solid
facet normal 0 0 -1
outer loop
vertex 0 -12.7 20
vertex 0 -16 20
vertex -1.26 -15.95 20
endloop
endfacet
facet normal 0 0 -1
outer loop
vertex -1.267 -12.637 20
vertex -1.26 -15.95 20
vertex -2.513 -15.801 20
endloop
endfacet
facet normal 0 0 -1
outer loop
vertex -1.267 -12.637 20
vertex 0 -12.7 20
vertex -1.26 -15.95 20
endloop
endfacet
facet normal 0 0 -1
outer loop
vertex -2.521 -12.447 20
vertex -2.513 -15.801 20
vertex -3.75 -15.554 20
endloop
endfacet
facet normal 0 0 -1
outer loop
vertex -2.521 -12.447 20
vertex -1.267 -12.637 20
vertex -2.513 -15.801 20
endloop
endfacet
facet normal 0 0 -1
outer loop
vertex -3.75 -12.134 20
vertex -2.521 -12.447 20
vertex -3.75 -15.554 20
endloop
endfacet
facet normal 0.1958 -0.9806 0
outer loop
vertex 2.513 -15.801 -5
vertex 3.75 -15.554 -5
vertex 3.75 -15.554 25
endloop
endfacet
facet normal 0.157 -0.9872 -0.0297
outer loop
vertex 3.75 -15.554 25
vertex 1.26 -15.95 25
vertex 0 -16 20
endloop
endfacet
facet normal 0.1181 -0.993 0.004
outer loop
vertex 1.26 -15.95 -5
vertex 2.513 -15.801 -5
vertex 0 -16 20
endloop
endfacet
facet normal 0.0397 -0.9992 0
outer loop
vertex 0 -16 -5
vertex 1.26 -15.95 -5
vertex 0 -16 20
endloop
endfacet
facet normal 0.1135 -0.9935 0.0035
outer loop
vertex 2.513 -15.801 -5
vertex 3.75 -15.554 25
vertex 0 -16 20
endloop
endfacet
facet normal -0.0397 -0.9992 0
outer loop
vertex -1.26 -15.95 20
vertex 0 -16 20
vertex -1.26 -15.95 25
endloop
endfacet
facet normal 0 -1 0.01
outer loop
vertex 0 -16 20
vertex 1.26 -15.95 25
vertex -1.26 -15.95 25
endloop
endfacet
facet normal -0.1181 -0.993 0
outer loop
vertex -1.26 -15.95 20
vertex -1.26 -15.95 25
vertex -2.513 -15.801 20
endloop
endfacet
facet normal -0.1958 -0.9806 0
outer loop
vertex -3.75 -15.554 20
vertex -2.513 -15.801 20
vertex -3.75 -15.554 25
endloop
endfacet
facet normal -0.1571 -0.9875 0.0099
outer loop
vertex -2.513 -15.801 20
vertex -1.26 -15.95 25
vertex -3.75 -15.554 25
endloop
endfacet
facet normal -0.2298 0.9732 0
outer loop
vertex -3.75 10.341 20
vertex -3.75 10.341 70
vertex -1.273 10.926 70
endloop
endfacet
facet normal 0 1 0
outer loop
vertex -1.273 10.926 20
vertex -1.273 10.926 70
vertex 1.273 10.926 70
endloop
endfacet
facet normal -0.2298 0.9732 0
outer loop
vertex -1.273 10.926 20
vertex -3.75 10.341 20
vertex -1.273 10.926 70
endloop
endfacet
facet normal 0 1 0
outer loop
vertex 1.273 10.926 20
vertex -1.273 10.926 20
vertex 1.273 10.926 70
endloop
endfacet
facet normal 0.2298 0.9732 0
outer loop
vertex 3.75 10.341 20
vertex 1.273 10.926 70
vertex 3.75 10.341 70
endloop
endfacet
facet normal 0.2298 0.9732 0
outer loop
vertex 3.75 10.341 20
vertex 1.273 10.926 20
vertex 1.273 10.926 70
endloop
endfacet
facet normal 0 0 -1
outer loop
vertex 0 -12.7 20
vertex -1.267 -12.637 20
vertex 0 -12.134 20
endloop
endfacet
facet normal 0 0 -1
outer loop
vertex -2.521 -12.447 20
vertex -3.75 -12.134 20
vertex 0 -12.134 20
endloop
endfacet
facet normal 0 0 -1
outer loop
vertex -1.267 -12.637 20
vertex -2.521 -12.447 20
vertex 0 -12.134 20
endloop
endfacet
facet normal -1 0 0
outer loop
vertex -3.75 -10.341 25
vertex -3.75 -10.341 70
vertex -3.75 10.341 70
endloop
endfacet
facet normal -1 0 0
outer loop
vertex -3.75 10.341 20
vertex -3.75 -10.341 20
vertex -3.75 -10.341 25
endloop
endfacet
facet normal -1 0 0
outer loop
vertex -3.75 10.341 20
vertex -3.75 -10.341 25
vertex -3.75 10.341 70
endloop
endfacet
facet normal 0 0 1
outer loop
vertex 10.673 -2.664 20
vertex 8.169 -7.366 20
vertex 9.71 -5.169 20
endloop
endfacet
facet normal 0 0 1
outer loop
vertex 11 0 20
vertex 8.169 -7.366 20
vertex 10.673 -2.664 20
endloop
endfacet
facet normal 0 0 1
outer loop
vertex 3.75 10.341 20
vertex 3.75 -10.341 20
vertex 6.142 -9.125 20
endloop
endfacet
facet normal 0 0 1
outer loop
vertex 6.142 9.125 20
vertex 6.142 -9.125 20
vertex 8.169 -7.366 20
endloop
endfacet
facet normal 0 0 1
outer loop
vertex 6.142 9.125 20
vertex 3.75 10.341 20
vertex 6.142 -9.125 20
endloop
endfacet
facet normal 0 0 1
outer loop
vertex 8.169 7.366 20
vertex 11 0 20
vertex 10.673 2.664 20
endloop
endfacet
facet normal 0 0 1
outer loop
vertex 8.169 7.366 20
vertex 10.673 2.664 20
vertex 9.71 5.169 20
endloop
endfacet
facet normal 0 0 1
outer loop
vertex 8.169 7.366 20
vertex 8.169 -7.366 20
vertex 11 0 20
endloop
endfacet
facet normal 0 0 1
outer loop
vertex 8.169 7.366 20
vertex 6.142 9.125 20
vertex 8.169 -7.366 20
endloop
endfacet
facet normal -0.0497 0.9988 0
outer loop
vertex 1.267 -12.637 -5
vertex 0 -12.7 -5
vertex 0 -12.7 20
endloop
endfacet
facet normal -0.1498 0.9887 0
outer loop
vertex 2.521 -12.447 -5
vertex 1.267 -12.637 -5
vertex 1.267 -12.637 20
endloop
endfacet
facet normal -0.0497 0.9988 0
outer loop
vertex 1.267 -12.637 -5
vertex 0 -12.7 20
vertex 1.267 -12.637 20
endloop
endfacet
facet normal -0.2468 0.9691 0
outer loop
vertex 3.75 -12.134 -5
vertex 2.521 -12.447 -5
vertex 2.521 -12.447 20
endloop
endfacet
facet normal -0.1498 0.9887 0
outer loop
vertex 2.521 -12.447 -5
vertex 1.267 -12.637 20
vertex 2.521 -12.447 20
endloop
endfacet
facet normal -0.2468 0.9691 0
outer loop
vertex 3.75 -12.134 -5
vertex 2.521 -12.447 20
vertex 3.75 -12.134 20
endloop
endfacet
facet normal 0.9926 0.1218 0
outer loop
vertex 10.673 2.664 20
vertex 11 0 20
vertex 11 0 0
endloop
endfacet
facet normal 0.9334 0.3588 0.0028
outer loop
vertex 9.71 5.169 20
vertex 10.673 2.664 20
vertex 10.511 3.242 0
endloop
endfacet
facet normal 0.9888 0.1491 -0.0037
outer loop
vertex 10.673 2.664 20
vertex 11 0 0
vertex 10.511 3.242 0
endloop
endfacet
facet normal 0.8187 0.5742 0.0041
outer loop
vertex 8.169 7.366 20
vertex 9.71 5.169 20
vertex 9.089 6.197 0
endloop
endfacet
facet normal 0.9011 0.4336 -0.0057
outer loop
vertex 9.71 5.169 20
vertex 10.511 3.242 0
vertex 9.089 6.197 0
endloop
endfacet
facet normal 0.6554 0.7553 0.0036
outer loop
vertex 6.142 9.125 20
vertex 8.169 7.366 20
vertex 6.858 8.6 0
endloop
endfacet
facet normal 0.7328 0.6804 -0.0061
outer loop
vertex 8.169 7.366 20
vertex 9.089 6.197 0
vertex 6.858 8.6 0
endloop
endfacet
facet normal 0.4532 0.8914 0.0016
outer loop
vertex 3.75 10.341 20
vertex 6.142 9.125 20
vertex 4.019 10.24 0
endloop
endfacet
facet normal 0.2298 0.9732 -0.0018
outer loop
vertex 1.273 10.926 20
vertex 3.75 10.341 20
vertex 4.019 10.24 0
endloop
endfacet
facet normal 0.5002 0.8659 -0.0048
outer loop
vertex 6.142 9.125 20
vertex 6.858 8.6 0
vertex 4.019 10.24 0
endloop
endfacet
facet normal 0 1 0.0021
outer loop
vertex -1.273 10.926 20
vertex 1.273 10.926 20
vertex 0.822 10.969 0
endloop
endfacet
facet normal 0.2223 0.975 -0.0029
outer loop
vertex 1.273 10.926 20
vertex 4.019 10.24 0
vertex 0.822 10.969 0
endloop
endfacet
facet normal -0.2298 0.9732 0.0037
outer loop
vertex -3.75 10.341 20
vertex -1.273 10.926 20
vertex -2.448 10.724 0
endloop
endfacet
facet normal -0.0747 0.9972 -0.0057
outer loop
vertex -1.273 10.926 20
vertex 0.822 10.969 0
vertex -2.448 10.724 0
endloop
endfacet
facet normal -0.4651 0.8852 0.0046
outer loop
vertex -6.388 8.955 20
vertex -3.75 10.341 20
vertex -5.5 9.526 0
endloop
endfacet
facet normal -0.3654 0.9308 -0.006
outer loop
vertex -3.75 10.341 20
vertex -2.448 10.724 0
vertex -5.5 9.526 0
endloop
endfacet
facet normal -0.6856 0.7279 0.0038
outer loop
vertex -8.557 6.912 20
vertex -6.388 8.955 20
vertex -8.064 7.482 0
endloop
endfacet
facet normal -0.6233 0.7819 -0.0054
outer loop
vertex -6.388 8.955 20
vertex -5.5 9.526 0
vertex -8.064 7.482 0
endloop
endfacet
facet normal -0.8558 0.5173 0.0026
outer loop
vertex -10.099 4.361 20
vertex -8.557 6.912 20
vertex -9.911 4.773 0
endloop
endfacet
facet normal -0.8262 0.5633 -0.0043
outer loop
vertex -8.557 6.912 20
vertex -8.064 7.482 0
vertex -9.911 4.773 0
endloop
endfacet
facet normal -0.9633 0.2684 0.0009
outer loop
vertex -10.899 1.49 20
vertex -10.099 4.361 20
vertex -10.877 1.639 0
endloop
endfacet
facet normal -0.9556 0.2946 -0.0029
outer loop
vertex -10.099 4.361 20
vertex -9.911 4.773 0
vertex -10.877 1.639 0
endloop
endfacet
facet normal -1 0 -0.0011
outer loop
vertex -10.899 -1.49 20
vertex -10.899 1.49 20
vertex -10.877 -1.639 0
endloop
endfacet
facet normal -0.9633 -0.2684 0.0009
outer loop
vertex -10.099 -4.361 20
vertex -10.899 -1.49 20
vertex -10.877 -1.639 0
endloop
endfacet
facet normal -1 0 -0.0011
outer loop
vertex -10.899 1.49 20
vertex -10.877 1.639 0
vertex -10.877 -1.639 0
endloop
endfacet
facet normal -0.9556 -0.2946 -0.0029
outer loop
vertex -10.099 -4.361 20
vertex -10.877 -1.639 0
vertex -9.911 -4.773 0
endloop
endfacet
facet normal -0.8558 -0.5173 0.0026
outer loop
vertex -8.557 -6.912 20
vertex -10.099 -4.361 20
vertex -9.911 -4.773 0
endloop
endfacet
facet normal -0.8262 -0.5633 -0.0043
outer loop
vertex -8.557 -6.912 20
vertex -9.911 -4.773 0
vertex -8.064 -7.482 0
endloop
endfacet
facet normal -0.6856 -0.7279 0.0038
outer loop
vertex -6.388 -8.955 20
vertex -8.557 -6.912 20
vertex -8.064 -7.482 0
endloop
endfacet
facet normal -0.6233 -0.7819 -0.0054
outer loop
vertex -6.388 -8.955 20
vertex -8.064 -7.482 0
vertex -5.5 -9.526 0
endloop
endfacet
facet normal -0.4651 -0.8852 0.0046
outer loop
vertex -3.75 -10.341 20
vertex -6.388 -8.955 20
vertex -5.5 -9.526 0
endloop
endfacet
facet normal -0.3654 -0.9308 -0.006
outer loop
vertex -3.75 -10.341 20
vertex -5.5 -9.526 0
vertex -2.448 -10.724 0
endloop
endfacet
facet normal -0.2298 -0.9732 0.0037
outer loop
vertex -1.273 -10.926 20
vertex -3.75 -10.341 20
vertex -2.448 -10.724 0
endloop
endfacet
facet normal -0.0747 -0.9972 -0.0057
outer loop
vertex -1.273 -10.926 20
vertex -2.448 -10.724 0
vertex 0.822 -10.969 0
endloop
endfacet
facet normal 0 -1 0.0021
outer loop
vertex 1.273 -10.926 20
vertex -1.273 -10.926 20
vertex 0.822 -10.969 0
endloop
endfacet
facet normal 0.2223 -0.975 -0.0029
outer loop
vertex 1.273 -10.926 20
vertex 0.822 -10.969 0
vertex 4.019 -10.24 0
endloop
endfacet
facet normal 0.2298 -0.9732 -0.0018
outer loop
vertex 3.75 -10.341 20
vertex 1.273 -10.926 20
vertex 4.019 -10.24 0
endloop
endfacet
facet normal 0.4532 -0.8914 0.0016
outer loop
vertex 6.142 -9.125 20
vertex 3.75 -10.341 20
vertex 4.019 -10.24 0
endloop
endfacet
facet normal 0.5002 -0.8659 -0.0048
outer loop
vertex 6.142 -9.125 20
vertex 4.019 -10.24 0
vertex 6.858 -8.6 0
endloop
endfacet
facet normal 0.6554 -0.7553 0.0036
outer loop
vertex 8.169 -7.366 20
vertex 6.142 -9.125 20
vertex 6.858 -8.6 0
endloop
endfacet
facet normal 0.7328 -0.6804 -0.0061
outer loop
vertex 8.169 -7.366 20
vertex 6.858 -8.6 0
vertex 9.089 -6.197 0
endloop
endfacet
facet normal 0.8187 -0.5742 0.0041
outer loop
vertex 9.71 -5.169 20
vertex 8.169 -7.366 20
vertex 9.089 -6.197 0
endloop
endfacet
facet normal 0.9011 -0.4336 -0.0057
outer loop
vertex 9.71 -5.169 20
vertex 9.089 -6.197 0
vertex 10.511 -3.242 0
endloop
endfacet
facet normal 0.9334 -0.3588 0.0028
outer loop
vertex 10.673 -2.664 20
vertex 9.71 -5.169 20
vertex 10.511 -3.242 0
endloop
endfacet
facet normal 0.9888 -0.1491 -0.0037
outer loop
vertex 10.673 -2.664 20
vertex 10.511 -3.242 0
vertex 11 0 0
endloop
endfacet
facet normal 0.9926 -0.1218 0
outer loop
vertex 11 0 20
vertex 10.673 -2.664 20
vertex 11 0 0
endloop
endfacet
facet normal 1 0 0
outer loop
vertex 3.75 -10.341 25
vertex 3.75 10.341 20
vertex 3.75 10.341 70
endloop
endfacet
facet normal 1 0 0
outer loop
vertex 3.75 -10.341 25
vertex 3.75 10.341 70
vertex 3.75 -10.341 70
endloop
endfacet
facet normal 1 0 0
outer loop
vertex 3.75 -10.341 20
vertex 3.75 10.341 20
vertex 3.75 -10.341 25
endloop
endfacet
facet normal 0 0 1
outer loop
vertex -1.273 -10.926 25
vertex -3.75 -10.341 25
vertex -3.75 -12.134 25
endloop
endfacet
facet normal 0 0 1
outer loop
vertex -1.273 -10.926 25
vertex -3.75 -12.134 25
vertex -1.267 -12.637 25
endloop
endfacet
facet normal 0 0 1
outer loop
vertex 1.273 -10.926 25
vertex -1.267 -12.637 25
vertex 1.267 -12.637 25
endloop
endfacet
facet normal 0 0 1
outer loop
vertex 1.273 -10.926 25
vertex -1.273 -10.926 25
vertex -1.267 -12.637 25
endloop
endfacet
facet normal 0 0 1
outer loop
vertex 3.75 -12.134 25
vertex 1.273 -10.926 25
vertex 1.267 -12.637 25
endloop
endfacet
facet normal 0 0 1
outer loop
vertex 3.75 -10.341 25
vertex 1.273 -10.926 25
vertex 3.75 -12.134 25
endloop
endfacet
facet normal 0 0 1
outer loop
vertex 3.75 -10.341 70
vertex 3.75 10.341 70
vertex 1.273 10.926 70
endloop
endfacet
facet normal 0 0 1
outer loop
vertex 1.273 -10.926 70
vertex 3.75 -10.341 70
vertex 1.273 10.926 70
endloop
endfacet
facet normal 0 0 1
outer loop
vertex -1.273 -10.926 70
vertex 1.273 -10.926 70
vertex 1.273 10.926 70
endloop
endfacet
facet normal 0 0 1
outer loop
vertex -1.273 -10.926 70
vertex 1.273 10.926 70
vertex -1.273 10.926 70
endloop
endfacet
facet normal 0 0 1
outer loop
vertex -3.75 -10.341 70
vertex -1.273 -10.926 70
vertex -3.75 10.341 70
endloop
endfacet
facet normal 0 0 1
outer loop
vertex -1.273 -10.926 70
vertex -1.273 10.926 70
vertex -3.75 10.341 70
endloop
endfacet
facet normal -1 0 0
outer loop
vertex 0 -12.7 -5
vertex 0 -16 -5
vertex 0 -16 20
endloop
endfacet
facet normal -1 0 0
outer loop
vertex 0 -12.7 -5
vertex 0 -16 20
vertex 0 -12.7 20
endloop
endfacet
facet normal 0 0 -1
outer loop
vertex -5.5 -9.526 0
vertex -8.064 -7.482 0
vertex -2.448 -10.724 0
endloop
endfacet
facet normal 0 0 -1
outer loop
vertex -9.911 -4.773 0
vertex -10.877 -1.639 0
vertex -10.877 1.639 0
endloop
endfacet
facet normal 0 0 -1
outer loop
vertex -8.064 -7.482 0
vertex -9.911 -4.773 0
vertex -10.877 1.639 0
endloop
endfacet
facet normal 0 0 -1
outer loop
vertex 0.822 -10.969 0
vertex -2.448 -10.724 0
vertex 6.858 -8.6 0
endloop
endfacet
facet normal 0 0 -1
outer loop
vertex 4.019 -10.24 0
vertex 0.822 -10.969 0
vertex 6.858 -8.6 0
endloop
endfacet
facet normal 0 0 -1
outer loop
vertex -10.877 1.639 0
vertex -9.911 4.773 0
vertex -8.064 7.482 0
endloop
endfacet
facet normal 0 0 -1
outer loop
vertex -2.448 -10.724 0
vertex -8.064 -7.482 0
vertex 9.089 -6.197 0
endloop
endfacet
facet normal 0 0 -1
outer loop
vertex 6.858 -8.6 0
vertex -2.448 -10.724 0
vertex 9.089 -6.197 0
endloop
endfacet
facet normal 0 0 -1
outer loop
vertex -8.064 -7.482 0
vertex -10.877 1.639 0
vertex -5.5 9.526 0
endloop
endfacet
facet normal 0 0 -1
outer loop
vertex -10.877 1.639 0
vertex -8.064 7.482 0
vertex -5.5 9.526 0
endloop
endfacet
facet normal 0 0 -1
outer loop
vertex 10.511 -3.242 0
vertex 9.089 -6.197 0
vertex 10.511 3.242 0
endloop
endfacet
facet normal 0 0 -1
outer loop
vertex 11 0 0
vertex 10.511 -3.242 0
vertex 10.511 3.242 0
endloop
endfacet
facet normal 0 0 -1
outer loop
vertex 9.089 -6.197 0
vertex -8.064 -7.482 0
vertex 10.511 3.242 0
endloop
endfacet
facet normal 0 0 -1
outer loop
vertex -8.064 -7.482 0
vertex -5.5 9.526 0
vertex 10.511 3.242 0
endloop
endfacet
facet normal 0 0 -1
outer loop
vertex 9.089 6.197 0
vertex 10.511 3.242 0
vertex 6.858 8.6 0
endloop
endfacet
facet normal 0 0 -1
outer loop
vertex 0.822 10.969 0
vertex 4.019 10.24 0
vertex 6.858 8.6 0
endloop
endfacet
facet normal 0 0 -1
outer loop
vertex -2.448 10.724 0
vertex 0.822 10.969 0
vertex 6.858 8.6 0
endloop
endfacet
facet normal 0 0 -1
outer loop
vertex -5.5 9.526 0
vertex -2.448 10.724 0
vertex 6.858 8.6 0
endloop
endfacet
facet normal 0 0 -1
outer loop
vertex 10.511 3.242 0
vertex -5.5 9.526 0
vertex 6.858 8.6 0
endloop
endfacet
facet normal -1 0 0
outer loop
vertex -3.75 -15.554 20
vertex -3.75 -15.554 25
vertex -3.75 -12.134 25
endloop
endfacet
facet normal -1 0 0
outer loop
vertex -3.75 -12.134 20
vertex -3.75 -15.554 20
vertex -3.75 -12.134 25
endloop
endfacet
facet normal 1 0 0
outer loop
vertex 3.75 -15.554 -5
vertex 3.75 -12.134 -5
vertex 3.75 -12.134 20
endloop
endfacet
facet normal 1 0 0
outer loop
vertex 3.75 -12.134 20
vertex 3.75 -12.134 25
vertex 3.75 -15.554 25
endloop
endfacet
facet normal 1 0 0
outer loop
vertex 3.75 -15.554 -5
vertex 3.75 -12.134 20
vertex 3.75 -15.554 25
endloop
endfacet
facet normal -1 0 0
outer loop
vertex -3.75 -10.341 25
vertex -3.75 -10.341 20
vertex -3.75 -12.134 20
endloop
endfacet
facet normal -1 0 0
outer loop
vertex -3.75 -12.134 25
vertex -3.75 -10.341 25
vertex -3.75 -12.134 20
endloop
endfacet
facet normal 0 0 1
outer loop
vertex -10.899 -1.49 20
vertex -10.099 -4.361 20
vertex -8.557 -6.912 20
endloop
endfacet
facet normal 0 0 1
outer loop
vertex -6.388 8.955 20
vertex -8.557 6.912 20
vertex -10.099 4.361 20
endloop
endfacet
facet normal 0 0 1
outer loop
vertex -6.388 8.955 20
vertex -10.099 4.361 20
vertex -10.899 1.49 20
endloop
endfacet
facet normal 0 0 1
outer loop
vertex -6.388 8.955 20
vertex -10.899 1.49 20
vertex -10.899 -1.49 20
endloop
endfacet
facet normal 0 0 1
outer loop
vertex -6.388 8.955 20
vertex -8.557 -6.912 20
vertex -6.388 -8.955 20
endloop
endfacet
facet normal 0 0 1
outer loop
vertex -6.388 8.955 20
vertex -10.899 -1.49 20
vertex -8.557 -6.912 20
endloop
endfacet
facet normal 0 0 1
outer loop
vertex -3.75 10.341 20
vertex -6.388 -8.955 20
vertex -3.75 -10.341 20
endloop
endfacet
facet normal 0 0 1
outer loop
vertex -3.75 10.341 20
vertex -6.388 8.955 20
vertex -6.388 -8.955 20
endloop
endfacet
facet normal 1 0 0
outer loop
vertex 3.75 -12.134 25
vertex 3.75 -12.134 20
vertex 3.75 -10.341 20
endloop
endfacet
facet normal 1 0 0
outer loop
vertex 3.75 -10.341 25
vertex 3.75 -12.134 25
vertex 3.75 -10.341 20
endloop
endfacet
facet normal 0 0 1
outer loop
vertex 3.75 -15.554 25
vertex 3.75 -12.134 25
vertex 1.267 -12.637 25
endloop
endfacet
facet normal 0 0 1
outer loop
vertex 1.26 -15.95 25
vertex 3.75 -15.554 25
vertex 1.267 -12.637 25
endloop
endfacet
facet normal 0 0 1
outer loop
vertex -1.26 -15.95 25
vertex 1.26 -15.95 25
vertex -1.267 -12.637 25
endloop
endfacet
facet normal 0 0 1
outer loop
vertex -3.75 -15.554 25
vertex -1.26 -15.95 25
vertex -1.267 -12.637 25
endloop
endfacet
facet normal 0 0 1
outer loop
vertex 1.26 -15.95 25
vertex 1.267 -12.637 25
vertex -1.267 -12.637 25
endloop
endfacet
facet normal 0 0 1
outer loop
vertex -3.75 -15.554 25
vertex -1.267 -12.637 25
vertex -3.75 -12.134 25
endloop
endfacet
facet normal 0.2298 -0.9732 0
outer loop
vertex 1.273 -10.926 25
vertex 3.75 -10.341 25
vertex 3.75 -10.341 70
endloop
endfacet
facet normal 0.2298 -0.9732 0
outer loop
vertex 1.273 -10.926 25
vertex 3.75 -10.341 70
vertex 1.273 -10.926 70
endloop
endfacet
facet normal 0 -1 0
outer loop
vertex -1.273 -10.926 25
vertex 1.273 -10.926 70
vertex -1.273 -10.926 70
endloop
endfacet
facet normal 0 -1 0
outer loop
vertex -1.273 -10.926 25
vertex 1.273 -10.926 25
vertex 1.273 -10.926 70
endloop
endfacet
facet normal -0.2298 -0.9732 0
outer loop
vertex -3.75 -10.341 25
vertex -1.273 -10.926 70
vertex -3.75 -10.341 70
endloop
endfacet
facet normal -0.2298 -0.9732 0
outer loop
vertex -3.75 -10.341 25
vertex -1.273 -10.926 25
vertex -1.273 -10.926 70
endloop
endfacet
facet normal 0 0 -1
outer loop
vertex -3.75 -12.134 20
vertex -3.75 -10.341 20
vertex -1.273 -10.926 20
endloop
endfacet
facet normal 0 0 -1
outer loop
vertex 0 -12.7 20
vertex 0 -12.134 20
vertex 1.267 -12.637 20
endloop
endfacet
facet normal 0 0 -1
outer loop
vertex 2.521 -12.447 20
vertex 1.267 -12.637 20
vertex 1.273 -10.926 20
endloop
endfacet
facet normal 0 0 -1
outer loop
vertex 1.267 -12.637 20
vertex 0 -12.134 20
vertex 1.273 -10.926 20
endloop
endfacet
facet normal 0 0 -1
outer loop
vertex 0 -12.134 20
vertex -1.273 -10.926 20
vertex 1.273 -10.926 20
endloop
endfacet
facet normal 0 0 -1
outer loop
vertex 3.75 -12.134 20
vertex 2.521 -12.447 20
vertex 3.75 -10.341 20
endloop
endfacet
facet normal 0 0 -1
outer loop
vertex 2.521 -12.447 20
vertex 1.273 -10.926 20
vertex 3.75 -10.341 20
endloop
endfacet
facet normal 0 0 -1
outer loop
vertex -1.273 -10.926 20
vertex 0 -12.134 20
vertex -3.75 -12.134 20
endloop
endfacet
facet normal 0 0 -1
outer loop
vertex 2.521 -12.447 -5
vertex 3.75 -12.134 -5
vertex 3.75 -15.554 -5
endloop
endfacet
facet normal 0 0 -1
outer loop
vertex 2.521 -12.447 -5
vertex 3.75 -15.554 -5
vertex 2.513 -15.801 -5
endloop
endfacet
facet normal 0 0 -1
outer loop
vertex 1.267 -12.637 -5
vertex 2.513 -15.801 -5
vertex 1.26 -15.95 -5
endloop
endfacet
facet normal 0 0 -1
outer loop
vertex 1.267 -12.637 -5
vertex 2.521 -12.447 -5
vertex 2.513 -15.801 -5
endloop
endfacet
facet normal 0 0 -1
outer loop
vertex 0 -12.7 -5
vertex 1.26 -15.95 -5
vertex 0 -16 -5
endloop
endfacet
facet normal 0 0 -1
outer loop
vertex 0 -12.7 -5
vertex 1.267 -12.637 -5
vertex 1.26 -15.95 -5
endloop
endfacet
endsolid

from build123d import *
from build123d.topology import SkipClean

# Parameters (mm, degrees)
SKETCH2_R               = 11
BOSS_EXTRUDE1_DEPTH     = 20
BOSS_EXTRUDE2_DEPTH     = 50
BOSS_EXTRUDE3_START     = -50
BOSS_EXTRUDE3_DEPTH     = 5
CUT_EXTRUDE2_DEPTH      = 72.992538676
CUT_EXTRUDE2_DEPTH_BACK = 72.992538676
SKETCH5_R               = 16.440704867
SKETCH5_R_2             = 12.7
BOSS_EXTRUDE4_START     = -5
BOSS_EXTRUDE4_DEPTH     = 30
CUT_EXTRUDE3_START      = 5
SKETCH7_W               = 3.75
SKETCH7_H               = 16.575715954
CUT_EXTRUDE3_DEPTH      = 25


with BuildPart() as part:
    # Sketch2 → Boss-Extrude1 (new body)
    with BuildSketch(Plane.XY):
        Circle(SKETCH2_R)
    extrude(amount=BOSS_EXTRUDE1_DEPTH)

    # Sketch3 → Boss-Extrude2 (add)
    with SkipClean():  # the faces are left unmerged after this step: merging them gives an invalid solid
        with BuildSketch(Plane.XY.offset(20)):
            with BuildLine():
                Line((3.75, 10.34105894), (3.75, -10.34105894))
                ThreePointArc((3.75, -10.34105894), (0, -11), (-3.75, -10.34105894))
                Line((-3.75, -10.34105894), (-3.75, 10.34105894))
                ThreePointArc((-3.75, 10.34105894), (0, 11), (3.75, 10.34105894))
            make_face()
        extrude(amount=BOSS_EXTRUDE2_DEPTH)

    # Sketch4 → Boss-Extrude3 (add)
    with SkipClean():  # the faces are left unmerged after this step: merging them gives an invalid solid
        with BuildSketch(Plane.XY.offset(70).offset(BOSS_EXTRUDE3_START)):
            with BuildLine():
                Line((-3.75, -10.34105894), (-3.75, -12.159898231))
                ThreePointArc((-3.75, -12.159898231), (0, -12.725), (3.75, -12.159898231))
                Line((3.75, -12.159898231), (3.75, -10.34105894))
                ThreePointArc((3.75, -10.34105894), (0, -11), (-3.75, -10.34105894))
            make_face()
        extrude(amount=BOSS_EXTRUDE3_DEPTH)

    # Sketch5 → Cut-Extrude2 (cut, two sides: drawn at the far end of the back side and taken through both)
    with SkipClean():  # the faces are left unmerged after this step: merging them gives an invalid solid
        with BuildSketch(Plane.XY.offset(70).offset(-CUT_EXTRUDE2_DEPTH_BACK)):
            Circle(SKETCH5_R)
            Circle(SKETCH5_R_2, mode=Mode.SUBTRACT)
        extrude(amount=CUT_EXTRUDE2_DEPTH + CUT_EXTRUDE2_DEPTH_BACK, mode=Mode.SUBTRACT)

    # Sketch6 → Boss-Extrude4 (add)
    with SkipClean():  # the faces are left unmerged after this step: merging them gives an invalid solid
        with BuildSketch(Plane(origin=(0, 0, 20), x_dir=(-1, 0, 0), z_dir=(0, 0, -1)).offset(BOSS_EXTRUDE4_START)):
            with BuildLine():
                Line((-3.75, -12.133733968), (-3.75, -15.55434023))
                ThreePointArc((-3.75, -15.55434023), (0, -16), (3.75, -15.55434023))
                Line((3.75, -15.55434023), (3.75, -12.133733968))
                ThreePointArc((3.75, -12.133733968), (0, -12.7), (-3.75, -12.133733968))
            make_face()
        extrude(amount=BOSS_EXTRUDE4_DEPTH)

    # Sketch7 → Cut-Extrude3 (cut)
    with SkipClean():  # the faces are left unmerged after this step: merging them gives an invalid solid
        with BuildSketch(Plane(origin=(0, 0, 0), x_dir=(-1, 0, 0), z_dir=(0, 0, -1)).offset(CUT_EXTRUDE3_START)):
            with Locations((1.875, -20.421591945)):
                Rectangle(SKETCH7_W, SKETCH7_H)
        extrude(amount=-CUT_EXTRUDE3_DEPTH, mode=Mode.SUBTRACT)


solid = part.part
